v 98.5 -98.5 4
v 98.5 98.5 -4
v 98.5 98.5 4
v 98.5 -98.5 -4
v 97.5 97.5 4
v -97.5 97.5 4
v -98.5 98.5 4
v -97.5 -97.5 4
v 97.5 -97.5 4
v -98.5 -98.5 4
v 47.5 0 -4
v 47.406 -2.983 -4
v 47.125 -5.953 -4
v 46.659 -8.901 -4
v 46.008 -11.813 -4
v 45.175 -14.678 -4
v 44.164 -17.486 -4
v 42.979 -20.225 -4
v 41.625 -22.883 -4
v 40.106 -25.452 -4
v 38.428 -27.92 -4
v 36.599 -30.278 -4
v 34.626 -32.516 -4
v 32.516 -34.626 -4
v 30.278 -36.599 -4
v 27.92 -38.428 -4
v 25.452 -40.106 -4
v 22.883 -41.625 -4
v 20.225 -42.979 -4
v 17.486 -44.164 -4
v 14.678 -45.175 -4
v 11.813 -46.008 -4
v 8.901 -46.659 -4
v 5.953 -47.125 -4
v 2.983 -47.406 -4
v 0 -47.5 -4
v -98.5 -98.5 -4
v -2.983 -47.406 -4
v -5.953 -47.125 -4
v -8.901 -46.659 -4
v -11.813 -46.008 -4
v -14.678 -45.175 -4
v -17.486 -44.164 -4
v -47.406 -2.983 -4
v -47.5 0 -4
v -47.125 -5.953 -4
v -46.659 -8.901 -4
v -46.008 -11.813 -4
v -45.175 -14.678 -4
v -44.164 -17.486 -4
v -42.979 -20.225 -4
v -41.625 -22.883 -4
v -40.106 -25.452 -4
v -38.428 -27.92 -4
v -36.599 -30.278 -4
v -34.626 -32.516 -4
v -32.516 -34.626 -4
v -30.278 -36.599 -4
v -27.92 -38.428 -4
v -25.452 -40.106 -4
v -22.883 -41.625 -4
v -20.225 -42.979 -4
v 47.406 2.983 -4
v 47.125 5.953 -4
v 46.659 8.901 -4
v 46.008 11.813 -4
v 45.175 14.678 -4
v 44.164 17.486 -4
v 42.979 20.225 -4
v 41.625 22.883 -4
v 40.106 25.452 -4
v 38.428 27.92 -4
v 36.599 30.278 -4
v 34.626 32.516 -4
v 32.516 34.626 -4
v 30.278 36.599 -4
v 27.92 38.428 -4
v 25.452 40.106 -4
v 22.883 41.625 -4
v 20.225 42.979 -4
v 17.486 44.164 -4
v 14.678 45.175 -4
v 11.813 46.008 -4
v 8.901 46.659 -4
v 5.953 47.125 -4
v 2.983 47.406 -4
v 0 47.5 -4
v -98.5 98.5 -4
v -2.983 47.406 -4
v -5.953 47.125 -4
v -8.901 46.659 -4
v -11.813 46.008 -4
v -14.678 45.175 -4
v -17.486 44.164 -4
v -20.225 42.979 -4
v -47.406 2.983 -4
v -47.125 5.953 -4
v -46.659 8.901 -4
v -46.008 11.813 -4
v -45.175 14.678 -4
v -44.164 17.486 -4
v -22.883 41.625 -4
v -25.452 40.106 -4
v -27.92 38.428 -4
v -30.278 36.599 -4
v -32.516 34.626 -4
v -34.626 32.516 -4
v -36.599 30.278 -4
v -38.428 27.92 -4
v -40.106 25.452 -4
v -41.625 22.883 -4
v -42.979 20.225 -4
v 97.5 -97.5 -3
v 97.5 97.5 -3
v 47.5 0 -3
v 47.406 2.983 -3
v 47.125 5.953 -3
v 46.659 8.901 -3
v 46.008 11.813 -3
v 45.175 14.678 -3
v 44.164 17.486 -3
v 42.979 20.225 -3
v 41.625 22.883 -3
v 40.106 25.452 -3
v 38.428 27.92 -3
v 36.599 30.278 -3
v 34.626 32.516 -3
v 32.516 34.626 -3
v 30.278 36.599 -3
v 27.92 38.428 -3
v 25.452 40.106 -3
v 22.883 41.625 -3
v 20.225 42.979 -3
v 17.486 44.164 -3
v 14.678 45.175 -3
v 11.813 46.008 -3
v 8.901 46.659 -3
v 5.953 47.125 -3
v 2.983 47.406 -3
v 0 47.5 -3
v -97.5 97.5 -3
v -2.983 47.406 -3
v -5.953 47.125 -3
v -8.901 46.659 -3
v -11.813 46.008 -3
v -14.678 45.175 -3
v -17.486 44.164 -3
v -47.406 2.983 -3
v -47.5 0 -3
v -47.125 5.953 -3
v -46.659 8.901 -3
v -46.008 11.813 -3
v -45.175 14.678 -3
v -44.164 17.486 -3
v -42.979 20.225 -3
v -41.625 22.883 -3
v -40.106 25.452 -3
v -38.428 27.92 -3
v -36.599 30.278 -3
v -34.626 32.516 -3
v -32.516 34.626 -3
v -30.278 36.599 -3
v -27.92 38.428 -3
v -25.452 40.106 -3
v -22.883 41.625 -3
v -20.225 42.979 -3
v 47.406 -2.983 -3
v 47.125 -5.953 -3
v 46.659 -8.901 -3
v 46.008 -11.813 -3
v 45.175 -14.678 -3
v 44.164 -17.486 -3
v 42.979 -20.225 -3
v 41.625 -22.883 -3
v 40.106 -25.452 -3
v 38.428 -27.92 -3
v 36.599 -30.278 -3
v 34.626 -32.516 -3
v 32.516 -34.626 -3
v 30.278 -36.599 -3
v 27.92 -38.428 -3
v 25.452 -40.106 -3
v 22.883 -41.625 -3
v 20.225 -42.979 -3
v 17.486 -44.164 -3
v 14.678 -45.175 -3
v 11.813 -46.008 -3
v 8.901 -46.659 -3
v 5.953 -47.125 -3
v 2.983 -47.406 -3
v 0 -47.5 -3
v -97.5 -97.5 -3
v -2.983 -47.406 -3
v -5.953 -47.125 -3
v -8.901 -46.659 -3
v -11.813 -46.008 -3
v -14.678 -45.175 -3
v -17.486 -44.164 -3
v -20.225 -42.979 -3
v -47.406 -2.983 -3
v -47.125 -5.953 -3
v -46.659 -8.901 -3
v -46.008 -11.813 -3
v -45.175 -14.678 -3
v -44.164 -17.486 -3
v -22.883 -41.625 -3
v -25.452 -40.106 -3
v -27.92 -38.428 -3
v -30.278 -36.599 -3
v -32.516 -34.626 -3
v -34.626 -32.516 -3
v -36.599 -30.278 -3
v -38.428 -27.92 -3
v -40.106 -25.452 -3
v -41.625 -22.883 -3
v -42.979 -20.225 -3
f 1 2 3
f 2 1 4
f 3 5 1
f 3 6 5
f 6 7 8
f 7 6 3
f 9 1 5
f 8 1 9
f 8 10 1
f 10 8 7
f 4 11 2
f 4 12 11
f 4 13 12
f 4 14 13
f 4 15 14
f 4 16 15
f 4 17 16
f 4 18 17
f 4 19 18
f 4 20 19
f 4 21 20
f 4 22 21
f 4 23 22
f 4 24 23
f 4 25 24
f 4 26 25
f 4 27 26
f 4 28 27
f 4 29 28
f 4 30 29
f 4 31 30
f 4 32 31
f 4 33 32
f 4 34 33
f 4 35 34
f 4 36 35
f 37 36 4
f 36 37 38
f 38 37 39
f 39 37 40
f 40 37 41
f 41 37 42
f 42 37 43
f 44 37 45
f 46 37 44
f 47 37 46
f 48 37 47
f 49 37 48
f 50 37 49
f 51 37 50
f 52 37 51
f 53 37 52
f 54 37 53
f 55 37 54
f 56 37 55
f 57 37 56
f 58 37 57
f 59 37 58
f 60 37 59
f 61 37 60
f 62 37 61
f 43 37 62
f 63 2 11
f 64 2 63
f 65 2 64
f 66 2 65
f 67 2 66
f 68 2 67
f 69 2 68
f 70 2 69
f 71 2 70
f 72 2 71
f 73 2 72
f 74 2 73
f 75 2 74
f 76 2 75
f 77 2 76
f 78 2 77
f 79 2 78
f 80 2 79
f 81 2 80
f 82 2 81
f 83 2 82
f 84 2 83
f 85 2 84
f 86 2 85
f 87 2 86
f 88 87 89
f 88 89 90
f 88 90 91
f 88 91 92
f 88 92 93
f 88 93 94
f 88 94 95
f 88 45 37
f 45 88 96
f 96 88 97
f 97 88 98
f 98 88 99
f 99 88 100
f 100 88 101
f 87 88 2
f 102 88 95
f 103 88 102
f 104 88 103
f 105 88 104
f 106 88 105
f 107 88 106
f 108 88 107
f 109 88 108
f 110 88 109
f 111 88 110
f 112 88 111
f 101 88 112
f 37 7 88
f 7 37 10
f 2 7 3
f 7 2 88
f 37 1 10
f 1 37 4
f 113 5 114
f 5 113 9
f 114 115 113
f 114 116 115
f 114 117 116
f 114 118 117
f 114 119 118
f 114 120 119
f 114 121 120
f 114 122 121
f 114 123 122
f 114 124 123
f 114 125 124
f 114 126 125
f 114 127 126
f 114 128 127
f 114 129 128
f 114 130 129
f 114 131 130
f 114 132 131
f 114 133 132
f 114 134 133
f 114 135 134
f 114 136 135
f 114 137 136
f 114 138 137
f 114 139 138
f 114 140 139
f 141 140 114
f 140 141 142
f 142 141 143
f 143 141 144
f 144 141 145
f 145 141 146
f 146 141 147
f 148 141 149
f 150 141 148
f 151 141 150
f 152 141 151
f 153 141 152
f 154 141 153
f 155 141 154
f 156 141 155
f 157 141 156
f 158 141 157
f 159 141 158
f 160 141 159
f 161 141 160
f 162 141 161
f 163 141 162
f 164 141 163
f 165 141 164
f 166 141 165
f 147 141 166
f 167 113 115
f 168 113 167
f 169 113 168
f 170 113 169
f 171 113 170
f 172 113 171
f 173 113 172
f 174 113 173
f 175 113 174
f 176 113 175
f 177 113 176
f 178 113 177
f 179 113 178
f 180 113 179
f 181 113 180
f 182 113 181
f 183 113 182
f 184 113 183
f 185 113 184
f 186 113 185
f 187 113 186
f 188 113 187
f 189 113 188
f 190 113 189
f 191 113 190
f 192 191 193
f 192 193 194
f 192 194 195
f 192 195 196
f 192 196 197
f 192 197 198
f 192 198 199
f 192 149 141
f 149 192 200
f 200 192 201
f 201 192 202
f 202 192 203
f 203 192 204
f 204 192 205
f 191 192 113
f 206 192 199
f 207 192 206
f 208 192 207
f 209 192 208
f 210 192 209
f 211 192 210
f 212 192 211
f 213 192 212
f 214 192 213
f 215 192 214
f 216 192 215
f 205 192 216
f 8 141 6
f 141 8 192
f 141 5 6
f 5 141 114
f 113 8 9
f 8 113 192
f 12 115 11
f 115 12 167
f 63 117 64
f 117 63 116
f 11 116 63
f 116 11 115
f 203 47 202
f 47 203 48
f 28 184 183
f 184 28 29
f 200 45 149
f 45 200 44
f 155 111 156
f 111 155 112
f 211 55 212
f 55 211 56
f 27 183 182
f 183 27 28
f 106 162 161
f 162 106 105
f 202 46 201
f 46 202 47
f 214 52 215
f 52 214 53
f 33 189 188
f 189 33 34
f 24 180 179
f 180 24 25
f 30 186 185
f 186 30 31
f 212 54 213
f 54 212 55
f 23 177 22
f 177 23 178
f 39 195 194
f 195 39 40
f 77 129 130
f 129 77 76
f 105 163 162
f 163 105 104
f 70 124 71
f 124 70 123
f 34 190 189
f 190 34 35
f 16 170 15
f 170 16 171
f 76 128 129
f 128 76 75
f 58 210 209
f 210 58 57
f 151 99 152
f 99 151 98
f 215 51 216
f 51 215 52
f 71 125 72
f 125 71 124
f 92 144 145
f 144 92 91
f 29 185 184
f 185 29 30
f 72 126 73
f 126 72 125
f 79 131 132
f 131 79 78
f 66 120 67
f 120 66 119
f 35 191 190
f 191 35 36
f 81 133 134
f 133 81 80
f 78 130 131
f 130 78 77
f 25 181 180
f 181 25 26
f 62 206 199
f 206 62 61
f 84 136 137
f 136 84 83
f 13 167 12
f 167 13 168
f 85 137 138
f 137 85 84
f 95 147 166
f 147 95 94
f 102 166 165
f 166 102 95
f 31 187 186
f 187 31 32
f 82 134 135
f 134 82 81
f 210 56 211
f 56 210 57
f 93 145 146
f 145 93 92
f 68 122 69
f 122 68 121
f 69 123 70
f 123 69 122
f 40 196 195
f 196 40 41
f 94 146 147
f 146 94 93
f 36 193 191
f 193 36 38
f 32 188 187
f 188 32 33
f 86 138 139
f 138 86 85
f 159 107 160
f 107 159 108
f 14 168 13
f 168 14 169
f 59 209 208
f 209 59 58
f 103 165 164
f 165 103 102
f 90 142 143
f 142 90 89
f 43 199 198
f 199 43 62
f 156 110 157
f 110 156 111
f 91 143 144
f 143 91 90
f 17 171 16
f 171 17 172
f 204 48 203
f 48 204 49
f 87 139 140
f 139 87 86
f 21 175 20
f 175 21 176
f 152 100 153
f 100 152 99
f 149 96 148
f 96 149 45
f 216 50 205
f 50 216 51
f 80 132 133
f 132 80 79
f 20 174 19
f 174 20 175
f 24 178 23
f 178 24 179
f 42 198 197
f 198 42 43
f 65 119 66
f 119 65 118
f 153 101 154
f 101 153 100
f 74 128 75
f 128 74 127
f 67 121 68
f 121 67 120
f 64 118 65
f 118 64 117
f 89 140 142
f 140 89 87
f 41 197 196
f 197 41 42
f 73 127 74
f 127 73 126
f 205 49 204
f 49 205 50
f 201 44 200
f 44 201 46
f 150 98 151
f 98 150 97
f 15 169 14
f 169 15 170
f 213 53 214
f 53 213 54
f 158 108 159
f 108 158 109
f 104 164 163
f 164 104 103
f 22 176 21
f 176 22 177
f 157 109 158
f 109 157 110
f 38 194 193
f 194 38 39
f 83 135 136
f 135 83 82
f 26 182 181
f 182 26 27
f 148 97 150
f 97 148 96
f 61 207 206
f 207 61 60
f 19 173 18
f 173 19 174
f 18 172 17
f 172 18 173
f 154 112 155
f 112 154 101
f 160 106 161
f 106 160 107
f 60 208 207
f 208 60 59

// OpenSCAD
BoxTopLength=197;
BoxTopWidth=197;
LipHeight=2;
LipThickness=2;
LipOverHangWidth=25;
BoxTopThickness=2;
IsOpenTop=true;


module BoxTop( boxTopLength, 
                boxTopWidth, 
                boxTopThickness, 
                lipHeight, 
                lipWallThicknesss, 
                isOpenTop, 
                OverHangMargin)


{
    if(isOpenTop)
    {
        //Create the overhang for the lid
        difference()
        {
             color("red")  cube([boxTopLength,boxTopWidth,lipHeight],true);
             translate([0,0,boxTopThickness ]) color("pink") cube([boxTopLength-lipWallThicknesss,boxTopWidth-lipWallThicknesss,lipHeight+2],true); 
          translate([0,0,-boxTopThickness-3]) color("orange") cylinder(10,47.5,47.5,$fn=100);

        }
    }
}



difference()
{
BoxTop(BoxTopLength,BoxTopLength,LipHeight,8, LipThickness, IsOpenTop, LipOverHangWidth);    
    //translate([0,0,8]) color("orange") cylinder(8,47.5,47.5,$fn=100);
}
